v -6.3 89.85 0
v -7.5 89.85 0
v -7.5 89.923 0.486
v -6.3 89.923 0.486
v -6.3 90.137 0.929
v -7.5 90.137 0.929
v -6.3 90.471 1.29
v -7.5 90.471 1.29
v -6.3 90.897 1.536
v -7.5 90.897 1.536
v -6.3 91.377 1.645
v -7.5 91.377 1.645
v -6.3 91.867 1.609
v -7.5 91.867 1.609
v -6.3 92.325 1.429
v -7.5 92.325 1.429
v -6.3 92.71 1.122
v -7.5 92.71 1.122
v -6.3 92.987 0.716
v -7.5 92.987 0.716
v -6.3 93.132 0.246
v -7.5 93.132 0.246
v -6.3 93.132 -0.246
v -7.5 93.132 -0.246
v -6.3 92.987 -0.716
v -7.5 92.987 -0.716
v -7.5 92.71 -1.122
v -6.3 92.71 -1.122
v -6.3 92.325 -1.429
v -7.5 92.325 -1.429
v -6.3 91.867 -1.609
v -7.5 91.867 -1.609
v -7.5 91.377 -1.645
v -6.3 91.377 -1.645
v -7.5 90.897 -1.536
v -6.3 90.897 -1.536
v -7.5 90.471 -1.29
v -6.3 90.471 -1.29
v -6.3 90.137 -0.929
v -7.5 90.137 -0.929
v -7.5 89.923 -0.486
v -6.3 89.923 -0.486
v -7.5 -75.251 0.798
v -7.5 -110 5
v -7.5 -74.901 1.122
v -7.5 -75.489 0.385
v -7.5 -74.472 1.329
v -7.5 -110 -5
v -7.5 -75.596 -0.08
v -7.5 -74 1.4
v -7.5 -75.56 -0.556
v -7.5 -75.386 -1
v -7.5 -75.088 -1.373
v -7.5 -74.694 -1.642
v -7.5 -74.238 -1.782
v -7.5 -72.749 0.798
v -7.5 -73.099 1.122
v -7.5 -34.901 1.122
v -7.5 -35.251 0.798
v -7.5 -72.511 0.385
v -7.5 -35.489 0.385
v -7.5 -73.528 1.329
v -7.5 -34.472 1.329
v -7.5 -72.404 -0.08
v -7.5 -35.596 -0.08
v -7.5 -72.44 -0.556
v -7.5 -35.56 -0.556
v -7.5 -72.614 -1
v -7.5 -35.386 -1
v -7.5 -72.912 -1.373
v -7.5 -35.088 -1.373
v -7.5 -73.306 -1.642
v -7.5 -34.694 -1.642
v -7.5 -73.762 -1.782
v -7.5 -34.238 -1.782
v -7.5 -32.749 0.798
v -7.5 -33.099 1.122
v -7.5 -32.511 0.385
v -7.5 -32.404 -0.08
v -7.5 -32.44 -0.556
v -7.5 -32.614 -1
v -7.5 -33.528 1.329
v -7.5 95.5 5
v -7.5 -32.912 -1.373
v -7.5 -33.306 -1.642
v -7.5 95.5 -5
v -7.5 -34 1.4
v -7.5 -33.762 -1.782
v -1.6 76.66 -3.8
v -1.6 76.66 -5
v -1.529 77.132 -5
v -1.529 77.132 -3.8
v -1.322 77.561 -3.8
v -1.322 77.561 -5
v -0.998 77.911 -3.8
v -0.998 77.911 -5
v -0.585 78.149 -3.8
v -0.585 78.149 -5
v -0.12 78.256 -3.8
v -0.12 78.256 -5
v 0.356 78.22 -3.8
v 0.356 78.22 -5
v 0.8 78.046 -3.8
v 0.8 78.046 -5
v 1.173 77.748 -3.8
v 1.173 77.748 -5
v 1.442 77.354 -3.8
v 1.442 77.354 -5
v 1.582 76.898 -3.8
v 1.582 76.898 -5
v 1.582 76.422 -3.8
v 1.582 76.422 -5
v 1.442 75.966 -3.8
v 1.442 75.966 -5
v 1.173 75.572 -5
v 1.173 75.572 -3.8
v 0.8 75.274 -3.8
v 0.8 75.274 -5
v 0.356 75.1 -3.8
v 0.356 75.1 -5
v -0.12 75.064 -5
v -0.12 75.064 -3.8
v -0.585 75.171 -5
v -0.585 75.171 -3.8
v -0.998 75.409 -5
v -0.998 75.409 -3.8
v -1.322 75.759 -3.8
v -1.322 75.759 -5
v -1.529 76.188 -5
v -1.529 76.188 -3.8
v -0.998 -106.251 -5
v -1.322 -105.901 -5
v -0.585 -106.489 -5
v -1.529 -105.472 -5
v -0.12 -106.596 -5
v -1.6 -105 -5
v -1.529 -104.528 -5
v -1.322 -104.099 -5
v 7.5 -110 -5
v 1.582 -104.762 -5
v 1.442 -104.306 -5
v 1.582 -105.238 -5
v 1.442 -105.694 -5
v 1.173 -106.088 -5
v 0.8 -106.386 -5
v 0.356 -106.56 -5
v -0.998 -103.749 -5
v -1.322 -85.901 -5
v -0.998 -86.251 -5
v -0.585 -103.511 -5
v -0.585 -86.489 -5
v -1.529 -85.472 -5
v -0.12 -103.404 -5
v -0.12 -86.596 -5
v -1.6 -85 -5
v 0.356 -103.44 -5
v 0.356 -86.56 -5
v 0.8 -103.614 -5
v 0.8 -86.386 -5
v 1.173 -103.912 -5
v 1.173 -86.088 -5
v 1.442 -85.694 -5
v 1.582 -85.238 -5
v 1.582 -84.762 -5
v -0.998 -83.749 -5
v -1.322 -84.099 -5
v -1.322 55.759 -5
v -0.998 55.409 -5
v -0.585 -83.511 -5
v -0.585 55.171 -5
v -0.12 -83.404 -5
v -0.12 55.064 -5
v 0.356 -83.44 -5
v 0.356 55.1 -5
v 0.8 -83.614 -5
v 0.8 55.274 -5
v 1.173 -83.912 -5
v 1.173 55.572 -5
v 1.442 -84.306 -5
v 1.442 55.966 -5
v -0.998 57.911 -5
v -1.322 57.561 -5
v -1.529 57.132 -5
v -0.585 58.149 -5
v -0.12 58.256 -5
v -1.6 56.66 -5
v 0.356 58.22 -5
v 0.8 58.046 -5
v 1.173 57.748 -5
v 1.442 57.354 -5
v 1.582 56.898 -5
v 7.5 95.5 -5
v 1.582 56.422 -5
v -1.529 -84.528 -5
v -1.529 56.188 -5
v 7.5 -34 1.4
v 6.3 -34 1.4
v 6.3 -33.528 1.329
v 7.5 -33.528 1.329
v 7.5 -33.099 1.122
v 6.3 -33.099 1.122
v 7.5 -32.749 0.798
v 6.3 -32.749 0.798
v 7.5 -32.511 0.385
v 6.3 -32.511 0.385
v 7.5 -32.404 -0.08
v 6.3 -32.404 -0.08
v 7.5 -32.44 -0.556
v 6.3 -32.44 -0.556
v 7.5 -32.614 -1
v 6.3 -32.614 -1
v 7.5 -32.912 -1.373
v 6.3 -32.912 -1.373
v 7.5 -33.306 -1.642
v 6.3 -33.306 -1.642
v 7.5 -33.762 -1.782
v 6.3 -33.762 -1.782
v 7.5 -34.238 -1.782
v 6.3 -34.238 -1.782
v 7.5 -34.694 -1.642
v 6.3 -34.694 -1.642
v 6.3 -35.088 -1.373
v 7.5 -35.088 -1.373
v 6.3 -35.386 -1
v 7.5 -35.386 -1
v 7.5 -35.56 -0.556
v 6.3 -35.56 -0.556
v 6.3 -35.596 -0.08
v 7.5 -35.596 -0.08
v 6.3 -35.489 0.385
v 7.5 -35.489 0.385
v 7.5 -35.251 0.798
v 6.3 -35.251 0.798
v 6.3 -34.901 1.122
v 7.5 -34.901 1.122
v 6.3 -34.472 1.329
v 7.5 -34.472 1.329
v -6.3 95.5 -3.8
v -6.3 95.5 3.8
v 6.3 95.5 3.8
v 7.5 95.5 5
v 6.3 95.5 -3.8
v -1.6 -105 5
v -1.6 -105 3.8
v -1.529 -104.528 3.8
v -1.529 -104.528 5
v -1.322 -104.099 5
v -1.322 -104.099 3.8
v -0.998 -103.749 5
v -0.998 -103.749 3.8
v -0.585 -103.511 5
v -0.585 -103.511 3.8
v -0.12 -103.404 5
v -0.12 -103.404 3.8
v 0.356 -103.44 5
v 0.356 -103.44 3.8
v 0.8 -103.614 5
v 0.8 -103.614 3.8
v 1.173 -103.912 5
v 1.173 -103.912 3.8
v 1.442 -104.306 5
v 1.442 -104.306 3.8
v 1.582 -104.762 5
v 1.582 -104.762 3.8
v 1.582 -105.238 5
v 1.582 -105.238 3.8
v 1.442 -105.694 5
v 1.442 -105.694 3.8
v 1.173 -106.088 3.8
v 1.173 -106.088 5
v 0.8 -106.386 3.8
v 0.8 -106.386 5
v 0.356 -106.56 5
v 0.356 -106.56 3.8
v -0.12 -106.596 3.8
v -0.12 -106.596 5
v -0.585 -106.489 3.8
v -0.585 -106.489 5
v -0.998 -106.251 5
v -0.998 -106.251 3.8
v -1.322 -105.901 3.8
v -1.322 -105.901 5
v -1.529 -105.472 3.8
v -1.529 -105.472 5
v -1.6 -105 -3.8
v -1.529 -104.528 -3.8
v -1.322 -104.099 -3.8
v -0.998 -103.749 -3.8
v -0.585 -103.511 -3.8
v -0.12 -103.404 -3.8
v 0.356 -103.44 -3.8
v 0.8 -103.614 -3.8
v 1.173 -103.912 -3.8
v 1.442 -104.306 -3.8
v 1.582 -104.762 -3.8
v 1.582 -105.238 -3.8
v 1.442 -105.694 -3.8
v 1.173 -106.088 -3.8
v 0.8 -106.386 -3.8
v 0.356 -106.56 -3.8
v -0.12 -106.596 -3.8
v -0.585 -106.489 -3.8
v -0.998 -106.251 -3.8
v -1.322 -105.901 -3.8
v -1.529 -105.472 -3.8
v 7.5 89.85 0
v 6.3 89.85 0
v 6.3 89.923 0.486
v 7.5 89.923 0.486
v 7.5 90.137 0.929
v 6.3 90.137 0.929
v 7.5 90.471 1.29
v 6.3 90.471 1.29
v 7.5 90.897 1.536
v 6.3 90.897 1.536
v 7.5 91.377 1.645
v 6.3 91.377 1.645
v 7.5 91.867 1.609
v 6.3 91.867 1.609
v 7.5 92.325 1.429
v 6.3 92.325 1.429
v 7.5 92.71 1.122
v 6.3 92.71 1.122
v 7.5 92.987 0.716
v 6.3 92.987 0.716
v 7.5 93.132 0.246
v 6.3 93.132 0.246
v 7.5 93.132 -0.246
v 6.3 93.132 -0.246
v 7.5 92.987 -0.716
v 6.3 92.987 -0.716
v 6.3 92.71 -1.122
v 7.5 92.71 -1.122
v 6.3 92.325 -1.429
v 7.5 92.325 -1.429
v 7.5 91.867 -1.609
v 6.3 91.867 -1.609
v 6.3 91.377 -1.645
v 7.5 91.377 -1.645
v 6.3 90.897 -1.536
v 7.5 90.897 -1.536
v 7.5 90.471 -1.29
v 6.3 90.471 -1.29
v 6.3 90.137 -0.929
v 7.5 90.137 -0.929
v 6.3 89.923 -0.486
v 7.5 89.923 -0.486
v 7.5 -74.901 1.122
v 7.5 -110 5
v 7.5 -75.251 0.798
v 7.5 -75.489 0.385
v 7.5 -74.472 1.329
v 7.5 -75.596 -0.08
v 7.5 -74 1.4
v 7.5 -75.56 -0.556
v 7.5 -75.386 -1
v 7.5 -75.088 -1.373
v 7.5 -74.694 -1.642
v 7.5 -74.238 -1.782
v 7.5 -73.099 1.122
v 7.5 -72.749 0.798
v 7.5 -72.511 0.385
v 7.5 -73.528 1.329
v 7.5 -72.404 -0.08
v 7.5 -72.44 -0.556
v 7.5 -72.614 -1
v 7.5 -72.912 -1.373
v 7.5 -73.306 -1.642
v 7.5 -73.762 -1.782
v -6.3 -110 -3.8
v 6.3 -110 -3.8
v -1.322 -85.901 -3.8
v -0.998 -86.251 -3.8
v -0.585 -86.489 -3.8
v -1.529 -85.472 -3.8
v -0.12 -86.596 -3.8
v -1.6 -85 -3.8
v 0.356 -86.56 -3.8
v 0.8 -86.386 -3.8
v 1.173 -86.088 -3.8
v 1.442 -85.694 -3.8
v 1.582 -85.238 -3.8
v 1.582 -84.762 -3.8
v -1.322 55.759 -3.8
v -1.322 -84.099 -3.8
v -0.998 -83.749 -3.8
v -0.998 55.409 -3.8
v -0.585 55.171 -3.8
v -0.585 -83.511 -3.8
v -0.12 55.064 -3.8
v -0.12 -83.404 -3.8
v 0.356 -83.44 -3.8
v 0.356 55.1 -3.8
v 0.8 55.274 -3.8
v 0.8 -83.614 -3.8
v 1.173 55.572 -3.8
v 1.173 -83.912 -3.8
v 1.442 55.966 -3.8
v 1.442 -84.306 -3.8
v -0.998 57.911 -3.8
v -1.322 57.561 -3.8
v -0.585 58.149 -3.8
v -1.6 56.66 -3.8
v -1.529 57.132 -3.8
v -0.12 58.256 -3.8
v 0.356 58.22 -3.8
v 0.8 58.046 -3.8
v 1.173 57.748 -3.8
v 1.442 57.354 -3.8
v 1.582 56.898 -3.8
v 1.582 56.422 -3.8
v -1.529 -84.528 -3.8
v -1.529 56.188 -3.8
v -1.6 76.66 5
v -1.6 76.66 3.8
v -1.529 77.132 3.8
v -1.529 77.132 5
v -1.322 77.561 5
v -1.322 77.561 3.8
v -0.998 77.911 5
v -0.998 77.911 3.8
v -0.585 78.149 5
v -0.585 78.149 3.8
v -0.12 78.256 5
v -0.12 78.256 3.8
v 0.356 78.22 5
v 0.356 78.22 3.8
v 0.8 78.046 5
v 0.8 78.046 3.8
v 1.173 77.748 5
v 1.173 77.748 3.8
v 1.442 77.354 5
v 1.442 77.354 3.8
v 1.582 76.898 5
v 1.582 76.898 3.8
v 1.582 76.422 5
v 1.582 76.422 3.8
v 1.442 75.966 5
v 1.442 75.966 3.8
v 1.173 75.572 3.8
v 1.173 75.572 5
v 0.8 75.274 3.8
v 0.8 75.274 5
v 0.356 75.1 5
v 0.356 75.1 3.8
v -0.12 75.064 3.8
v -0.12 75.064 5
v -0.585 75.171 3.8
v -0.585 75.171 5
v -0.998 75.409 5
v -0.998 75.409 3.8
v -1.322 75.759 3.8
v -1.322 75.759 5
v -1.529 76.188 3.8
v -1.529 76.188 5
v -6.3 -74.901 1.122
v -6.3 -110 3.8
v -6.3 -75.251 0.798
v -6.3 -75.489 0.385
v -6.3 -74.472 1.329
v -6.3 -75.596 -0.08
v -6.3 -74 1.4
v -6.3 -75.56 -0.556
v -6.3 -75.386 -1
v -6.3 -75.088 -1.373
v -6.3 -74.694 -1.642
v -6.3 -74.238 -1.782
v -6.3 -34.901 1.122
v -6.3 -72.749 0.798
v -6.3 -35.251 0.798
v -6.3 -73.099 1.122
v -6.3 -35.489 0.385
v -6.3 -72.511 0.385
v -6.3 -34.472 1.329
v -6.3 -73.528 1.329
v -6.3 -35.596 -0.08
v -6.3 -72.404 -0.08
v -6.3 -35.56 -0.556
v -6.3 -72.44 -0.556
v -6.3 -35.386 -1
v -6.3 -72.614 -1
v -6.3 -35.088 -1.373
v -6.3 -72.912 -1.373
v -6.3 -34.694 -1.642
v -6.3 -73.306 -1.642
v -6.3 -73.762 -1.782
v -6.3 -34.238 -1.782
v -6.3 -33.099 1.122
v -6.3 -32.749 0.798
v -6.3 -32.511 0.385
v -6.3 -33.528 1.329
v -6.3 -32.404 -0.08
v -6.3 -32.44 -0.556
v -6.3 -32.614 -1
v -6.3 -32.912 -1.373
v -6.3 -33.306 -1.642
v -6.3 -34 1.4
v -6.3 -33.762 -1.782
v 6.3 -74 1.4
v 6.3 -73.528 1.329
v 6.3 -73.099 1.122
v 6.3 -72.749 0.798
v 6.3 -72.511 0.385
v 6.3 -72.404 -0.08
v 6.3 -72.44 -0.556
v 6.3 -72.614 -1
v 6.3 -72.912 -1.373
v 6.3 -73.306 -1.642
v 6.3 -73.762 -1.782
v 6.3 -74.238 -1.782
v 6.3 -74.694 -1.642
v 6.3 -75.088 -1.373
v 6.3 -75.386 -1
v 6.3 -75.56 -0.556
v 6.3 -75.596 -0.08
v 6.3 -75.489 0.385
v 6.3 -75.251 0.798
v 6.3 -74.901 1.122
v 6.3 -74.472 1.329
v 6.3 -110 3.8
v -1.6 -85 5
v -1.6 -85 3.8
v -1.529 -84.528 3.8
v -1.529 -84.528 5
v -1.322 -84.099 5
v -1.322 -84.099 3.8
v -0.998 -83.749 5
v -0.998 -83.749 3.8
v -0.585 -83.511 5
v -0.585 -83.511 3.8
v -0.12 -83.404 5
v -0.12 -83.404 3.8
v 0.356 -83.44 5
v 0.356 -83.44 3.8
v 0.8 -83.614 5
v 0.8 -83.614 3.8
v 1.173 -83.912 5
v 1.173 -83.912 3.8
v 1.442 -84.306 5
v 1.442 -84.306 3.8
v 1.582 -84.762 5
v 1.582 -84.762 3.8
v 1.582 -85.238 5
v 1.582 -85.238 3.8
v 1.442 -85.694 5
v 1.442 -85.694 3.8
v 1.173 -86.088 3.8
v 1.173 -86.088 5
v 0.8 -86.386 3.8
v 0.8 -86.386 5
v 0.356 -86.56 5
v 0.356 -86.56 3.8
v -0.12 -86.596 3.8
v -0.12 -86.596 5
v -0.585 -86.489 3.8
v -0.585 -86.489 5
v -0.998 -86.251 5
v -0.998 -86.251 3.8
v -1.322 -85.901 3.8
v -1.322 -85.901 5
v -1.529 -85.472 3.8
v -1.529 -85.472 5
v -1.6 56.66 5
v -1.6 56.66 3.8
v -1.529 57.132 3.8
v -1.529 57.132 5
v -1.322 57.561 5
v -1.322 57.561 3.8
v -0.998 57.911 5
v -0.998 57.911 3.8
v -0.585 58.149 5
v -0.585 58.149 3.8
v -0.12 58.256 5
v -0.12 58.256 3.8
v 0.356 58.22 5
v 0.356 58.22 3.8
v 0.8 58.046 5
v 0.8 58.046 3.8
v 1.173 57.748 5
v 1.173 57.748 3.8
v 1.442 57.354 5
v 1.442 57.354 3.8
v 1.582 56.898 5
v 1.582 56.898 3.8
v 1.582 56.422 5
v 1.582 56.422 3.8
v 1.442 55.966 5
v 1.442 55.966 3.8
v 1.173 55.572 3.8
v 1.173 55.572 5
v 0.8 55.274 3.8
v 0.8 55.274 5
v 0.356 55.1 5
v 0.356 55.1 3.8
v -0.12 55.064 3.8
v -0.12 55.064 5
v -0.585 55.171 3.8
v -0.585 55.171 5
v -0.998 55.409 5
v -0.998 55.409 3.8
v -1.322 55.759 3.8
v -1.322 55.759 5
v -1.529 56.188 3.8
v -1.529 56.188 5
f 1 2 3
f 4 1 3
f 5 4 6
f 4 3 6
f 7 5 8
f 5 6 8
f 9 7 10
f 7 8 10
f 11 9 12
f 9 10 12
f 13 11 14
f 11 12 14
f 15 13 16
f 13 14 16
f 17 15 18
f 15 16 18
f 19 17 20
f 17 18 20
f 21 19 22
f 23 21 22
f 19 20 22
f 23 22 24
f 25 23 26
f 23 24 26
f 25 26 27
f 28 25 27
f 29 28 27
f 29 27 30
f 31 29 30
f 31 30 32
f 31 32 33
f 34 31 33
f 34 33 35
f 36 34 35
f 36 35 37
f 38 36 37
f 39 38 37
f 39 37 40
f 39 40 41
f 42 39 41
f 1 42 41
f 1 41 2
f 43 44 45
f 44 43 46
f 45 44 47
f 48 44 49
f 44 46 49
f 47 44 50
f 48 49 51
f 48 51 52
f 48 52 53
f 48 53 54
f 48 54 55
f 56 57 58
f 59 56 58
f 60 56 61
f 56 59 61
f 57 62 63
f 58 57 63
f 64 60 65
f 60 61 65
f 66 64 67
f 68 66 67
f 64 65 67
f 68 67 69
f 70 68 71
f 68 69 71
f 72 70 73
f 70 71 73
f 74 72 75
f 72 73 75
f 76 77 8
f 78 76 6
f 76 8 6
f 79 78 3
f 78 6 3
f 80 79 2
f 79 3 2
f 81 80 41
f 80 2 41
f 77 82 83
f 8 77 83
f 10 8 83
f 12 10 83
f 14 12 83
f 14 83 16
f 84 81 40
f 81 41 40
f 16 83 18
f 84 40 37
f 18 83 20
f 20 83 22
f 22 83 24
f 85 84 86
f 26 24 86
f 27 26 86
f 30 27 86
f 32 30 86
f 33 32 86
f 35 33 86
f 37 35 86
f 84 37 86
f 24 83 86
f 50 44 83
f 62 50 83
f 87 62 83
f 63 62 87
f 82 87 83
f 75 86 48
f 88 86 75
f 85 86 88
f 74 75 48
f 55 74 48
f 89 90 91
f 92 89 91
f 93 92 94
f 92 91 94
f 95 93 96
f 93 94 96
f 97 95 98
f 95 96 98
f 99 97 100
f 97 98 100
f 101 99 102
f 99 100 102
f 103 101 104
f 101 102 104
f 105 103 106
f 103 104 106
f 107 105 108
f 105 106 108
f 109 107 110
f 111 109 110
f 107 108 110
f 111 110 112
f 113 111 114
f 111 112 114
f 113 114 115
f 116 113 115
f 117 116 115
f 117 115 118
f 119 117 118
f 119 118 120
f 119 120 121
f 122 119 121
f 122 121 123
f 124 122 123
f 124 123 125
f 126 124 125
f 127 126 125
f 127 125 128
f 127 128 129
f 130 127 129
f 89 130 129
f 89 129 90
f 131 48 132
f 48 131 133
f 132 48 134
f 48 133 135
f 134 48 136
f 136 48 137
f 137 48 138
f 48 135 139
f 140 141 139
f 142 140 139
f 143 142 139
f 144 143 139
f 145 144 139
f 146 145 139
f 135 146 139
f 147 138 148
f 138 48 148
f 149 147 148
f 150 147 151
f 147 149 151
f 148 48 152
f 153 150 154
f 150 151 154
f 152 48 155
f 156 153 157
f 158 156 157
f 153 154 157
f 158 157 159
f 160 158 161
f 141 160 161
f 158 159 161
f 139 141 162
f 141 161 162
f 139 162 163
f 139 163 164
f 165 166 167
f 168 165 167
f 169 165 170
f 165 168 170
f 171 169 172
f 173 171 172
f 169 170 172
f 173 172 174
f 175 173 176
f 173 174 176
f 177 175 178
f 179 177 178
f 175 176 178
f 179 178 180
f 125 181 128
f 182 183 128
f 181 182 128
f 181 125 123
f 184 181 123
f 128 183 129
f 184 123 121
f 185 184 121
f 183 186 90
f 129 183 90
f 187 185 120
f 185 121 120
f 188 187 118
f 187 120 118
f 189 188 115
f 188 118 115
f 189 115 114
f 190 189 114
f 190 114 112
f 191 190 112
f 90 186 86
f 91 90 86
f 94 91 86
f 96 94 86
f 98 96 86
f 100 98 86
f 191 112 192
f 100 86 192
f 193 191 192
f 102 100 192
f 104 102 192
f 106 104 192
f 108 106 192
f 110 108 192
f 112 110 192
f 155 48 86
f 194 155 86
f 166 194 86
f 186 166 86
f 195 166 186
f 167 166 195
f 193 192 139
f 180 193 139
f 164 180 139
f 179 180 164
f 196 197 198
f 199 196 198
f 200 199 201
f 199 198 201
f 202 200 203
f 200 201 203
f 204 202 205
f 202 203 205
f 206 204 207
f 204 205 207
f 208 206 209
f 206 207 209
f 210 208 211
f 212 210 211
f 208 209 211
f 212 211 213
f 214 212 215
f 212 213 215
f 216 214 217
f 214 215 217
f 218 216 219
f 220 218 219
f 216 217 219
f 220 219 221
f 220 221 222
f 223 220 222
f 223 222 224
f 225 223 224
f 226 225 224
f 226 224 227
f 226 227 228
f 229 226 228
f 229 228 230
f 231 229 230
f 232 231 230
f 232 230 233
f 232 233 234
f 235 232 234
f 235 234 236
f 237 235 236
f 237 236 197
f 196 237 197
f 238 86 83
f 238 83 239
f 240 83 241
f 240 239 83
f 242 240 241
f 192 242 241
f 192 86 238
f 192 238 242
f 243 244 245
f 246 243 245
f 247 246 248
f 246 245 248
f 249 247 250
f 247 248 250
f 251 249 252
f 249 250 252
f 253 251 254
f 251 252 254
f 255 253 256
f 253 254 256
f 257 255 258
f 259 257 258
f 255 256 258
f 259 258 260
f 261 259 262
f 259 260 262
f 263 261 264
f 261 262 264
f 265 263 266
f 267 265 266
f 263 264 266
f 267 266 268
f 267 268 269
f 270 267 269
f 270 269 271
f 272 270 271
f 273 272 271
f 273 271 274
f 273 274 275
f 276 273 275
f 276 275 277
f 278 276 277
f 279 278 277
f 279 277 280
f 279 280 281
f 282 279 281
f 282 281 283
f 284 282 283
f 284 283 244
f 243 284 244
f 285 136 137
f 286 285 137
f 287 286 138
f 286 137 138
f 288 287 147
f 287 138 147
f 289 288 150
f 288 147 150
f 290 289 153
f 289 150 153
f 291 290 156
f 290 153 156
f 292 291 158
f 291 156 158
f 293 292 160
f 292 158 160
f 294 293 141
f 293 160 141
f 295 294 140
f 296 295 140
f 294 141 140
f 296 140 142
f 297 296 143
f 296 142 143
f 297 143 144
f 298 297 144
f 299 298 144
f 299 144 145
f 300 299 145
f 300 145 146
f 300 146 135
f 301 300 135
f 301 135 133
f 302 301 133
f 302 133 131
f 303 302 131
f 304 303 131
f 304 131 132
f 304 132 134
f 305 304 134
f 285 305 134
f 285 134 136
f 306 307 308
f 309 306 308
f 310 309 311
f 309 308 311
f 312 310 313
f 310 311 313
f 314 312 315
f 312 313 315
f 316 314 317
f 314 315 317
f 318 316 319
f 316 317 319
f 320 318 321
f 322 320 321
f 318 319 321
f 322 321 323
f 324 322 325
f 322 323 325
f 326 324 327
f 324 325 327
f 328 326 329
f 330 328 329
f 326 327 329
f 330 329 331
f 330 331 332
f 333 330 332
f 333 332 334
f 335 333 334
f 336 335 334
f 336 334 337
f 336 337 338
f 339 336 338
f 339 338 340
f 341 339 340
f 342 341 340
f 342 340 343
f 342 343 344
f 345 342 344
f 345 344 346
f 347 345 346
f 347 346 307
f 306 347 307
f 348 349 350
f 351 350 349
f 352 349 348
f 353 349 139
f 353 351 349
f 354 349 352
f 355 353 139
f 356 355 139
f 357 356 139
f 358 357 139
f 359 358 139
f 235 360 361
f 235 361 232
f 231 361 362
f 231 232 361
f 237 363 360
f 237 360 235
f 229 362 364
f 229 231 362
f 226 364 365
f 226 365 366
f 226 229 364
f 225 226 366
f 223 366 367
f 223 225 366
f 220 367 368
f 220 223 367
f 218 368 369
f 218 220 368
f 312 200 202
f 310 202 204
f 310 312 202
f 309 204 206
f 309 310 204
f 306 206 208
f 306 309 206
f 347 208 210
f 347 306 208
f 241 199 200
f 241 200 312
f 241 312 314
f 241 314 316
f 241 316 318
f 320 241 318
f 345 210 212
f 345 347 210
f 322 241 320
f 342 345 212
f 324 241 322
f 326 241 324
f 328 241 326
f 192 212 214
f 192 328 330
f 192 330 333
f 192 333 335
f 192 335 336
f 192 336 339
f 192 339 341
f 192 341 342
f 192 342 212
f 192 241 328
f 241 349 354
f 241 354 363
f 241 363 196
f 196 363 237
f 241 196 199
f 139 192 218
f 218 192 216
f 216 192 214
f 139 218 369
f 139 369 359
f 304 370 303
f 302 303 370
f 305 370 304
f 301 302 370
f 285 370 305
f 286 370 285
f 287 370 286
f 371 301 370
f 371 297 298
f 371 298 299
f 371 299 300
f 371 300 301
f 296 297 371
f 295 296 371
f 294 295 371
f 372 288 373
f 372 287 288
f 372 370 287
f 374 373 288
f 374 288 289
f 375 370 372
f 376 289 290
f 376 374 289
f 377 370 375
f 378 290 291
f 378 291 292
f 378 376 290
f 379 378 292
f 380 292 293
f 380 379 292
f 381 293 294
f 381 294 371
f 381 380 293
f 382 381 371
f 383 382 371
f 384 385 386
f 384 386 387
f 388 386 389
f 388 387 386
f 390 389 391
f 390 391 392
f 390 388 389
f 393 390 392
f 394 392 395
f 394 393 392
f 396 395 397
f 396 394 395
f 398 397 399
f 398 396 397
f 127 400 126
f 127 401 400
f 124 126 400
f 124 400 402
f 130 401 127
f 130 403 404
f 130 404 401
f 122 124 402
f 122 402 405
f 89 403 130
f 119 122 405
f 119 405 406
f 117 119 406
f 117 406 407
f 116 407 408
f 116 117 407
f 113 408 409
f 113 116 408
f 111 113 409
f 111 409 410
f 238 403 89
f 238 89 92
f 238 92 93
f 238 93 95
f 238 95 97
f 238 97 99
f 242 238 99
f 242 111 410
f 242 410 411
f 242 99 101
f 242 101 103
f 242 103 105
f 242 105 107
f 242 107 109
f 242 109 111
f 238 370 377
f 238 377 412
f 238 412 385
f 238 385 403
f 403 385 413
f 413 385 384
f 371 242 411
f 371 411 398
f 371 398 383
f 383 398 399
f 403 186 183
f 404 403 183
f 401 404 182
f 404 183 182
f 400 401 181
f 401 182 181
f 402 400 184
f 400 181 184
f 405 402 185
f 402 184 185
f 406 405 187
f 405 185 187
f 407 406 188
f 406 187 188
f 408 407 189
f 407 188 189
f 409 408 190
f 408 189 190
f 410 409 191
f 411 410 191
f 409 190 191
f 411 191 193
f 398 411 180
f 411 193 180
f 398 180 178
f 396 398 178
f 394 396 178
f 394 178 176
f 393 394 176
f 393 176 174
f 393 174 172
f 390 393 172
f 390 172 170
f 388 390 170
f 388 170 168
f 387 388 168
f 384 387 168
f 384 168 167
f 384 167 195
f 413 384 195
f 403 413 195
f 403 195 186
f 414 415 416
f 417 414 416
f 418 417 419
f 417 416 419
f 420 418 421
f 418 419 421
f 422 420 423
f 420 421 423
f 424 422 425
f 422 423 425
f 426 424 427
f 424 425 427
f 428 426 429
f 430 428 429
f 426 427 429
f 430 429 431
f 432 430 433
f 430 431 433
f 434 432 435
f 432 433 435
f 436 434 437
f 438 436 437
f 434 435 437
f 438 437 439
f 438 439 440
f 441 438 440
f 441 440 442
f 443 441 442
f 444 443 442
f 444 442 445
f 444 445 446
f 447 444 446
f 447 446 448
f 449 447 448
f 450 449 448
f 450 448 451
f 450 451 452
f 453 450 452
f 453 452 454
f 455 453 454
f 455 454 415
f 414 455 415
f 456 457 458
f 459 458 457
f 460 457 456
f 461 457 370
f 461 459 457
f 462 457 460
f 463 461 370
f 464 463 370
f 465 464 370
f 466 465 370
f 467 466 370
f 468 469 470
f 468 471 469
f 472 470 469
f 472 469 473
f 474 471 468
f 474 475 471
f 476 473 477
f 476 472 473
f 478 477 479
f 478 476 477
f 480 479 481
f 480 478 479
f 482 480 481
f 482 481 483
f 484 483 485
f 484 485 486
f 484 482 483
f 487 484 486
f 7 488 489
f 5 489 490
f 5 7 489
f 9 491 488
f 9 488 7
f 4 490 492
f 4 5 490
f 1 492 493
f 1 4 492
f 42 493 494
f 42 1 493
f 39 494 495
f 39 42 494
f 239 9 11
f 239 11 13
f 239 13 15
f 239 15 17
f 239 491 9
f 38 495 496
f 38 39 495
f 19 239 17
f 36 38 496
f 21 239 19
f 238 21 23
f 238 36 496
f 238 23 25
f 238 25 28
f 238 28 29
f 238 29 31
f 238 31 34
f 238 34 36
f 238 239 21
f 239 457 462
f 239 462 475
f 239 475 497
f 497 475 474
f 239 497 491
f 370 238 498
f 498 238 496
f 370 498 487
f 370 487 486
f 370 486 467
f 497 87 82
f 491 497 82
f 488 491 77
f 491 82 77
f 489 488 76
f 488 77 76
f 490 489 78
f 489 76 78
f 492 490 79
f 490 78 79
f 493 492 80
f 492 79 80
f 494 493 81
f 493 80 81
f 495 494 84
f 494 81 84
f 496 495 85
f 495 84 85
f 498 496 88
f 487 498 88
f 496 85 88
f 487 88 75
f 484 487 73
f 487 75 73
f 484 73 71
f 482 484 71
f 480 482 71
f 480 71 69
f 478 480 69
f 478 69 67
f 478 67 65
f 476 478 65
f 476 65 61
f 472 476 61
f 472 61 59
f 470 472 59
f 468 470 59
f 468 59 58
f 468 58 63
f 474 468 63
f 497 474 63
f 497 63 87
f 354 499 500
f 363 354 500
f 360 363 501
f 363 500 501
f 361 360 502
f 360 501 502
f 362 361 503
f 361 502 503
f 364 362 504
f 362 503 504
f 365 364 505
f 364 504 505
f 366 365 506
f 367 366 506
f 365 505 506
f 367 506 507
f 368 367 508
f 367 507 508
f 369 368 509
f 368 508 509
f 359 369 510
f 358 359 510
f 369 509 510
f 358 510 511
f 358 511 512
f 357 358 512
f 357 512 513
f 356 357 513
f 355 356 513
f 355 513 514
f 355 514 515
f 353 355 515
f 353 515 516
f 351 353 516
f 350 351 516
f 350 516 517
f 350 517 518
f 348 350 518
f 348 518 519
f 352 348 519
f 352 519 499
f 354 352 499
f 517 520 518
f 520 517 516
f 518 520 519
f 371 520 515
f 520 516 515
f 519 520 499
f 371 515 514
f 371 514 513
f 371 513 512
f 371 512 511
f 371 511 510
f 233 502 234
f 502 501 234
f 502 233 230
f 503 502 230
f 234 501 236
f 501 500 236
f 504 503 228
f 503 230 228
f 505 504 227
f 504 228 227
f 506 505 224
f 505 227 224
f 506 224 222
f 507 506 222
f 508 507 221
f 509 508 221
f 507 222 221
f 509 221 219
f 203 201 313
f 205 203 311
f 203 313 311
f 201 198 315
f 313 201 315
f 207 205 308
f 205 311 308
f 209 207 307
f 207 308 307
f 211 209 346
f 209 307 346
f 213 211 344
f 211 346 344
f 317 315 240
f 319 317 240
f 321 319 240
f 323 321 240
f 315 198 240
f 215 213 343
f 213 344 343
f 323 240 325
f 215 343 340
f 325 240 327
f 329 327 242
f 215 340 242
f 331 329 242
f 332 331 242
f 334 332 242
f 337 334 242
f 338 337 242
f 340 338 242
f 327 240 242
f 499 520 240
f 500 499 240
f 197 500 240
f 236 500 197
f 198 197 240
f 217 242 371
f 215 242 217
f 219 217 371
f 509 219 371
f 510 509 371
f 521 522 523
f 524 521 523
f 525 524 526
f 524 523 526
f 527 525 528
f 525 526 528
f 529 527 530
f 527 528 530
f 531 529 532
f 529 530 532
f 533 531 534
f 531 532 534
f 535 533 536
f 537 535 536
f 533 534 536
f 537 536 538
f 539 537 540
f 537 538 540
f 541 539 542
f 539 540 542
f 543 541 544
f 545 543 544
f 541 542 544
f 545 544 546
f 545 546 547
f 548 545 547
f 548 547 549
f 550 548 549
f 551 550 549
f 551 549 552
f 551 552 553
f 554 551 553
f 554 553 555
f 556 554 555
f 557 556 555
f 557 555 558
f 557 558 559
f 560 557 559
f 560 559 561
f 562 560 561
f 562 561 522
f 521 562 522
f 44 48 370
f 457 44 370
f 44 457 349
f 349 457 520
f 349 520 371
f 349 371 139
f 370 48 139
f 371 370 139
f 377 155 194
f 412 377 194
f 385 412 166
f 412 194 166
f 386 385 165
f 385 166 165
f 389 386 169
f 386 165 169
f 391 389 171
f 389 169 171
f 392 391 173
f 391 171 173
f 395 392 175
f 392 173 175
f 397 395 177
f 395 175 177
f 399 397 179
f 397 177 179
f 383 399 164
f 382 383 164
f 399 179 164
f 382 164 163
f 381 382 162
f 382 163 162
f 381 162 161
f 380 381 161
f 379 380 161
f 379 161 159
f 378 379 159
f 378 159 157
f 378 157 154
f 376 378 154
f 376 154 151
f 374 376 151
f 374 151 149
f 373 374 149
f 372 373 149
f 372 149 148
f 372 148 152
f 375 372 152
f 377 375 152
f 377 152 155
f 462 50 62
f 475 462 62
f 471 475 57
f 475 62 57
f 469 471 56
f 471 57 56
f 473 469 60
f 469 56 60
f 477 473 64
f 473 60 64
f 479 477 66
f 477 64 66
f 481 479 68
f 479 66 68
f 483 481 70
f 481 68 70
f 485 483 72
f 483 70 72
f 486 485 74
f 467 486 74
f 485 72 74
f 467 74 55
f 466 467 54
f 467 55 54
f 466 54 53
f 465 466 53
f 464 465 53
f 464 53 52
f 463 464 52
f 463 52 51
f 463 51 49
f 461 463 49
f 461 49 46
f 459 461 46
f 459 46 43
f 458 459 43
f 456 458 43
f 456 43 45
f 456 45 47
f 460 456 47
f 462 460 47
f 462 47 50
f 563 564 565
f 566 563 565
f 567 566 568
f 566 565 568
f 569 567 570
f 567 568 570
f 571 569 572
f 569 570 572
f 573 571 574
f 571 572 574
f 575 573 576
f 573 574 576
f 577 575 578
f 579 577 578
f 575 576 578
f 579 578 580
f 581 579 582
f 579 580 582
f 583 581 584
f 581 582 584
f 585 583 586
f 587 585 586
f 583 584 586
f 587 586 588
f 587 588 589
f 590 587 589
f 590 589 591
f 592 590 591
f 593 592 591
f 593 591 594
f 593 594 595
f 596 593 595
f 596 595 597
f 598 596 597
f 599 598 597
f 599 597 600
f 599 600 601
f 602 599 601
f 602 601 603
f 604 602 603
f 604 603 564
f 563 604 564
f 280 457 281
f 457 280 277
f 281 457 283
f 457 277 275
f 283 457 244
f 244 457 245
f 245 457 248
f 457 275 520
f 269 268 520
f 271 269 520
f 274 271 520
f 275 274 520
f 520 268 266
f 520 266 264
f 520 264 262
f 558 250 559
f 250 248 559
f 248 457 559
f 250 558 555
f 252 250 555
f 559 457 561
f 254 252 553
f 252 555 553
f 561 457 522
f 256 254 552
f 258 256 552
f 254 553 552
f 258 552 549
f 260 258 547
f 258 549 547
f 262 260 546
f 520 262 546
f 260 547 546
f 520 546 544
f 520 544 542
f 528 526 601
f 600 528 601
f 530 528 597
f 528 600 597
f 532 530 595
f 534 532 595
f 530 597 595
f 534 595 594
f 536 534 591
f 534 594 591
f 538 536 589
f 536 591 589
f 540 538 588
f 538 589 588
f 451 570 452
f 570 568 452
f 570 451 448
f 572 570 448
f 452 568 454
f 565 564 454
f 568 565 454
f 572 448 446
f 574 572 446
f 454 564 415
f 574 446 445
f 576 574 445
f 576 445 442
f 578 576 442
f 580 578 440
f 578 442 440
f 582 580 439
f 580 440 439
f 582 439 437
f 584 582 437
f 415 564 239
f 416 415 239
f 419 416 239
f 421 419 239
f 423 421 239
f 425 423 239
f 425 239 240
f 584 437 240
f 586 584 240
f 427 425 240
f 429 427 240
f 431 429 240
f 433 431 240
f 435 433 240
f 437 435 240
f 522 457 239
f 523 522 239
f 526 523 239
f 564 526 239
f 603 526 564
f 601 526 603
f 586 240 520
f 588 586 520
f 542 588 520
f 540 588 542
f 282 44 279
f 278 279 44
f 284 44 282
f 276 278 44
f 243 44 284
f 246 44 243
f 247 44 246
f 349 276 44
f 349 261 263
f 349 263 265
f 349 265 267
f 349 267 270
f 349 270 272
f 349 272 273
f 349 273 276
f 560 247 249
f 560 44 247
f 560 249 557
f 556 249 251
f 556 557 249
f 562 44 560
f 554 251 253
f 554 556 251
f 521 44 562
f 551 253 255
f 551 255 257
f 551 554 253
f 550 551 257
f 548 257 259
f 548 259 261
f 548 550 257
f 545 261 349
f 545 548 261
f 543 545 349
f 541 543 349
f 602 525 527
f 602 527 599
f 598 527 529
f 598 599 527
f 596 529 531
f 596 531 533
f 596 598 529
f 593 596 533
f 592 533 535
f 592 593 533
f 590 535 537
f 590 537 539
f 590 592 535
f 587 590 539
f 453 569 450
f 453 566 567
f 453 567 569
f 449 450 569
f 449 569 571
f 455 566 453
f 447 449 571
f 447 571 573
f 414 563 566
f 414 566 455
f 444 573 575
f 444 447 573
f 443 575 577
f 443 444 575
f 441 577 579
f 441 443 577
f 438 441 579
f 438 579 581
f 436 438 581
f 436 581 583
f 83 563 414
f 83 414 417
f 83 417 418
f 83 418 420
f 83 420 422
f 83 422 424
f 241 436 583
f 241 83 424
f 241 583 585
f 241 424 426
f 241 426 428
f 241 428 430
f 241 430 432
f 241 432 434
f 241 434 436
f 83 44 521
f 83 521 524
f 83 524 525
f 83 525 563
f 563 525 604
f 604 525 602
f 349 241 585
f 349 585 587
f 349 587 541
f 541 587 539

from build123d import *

# Parameters (mm, degrees)
SKETCH_1_W          = 15
SKETCH_1_H          = 10
SKETCH_1_W_2        = 12.6
SKETCH_1_H_2        = 7.6
EXTRUDE_1_DEPTH     = 110
SKETCH_2_R          = 1.6
CUT_EXTRUDE_1_DEPTH = 100
SKETCH_3_R          = 1.6
CUT_EXTRUDE_2_DEPTH = 15
SKETCH_5_W          = 15
SKETCH_5_H          = 10
CUT_EXTRUDE_4_DEPTH = 14.5
SKETCH_6_R          = 1.6
CUT_EXTRUDE_5_DEPTH = 15
CUT_EXTRUDE_6_DEPTH = 15


with BuildPart() as part:
    # ｽｹｯﾁ1 → ﾎﾞｽ - 押し出し1 (new, symmetric)
    with BuildSketch(Plane(origin=(0, 0, 0), x_dir=(1, 0, 0), z_dir=(0, 1, 0))):
        Rectangle(SKETCH_1_W, SKETCH_1_H)
        Rectangle(SKETCH_1_W_2, SKETCH_1_H_2, mode=Mode.SUBTRACT)
    extrude(amount=EXTRUDE_1_DEPTH, both=True)

    # ｽｹｯﾁ2 → ｶｯﾄ - 押し出し1 (cut)
    with BuildSketch(Plane(origin=(0, 0, -5), x_dir=(-1, 0, 0), z_dir=(0, 0, -1))):
        with Locations((0, -85)):
            Circle(SKETCH_2_R)
        with Locations((0, -105)):
            Circle(SKETCH_2_R)
    extrude(amount=-CUT_EXTRUDE_1_DEPTH, mode=Mode.SUBTRACT)

    # ｽｹｯﾁ3 → ｶｯﾄ - 押し出し2 (cut)
    with BuildSketch(Plane.ZY.offset(7.5)):
        with Locations((-0.2, -74)):
            Circle(SKETCH_3_R)
        with Locations((-0.2, -34)):
            Circle(SKETCH_3_R)
    extrude(amount=-CUT_EXTRUDE_2_DEPTH, mode=Mode.SUBTRACT)

    # ｽｹｯﾁ5 → ｶｯﾄ - 押し出し4 (cut)
    with BuildSketch(Plane(origin=(0, 110, 0), x_dir=(1, 0, 0), z_dir=(0, 1, 0))):
        Rectangle(SKETCH_5_W, SKETCH_5_H)
    extrude(amount=-CUT_EXTRUDE_4_DEPTH, mode=Mode.SUBTRACT)

    # ｽｹｯﾁ6 → ｶｯﾄ - 押し出し5 (cut)
    with BuildSketch(Plane(origin=(0, 0, -5), x_dir=(-1, 0, 0), z_dir=(0, 0, -1))):
        with Locations((0, 56.66)):
            Circle(SKETCH_6_R)
        with Locations((0, 76.66)):
            Circle(SKETCH_6_R)
    extrude(amount=-CUT_EXTRUDE_5_DEPTH, mode=Mode.SUBTRACT)

    # ｽｹｯﾁ7 → ｶｯﾄ - 押し出し6 (cut)
    with BuildSketch(Plane.ZY.offset(7.5)):
        with BuildLine():
            ThreePointArc((0, 93.15), (-1.65, 91.5), (0, 89.85))
            ThreePointArc((0, 89.85), (1.65, 91.5), (0, 93.15))
        make_face()
    extrude(amount=-CUT_EXTRUDE_6_DEPTH, mode=Mode.SUBTRACT)


solid = part.part
